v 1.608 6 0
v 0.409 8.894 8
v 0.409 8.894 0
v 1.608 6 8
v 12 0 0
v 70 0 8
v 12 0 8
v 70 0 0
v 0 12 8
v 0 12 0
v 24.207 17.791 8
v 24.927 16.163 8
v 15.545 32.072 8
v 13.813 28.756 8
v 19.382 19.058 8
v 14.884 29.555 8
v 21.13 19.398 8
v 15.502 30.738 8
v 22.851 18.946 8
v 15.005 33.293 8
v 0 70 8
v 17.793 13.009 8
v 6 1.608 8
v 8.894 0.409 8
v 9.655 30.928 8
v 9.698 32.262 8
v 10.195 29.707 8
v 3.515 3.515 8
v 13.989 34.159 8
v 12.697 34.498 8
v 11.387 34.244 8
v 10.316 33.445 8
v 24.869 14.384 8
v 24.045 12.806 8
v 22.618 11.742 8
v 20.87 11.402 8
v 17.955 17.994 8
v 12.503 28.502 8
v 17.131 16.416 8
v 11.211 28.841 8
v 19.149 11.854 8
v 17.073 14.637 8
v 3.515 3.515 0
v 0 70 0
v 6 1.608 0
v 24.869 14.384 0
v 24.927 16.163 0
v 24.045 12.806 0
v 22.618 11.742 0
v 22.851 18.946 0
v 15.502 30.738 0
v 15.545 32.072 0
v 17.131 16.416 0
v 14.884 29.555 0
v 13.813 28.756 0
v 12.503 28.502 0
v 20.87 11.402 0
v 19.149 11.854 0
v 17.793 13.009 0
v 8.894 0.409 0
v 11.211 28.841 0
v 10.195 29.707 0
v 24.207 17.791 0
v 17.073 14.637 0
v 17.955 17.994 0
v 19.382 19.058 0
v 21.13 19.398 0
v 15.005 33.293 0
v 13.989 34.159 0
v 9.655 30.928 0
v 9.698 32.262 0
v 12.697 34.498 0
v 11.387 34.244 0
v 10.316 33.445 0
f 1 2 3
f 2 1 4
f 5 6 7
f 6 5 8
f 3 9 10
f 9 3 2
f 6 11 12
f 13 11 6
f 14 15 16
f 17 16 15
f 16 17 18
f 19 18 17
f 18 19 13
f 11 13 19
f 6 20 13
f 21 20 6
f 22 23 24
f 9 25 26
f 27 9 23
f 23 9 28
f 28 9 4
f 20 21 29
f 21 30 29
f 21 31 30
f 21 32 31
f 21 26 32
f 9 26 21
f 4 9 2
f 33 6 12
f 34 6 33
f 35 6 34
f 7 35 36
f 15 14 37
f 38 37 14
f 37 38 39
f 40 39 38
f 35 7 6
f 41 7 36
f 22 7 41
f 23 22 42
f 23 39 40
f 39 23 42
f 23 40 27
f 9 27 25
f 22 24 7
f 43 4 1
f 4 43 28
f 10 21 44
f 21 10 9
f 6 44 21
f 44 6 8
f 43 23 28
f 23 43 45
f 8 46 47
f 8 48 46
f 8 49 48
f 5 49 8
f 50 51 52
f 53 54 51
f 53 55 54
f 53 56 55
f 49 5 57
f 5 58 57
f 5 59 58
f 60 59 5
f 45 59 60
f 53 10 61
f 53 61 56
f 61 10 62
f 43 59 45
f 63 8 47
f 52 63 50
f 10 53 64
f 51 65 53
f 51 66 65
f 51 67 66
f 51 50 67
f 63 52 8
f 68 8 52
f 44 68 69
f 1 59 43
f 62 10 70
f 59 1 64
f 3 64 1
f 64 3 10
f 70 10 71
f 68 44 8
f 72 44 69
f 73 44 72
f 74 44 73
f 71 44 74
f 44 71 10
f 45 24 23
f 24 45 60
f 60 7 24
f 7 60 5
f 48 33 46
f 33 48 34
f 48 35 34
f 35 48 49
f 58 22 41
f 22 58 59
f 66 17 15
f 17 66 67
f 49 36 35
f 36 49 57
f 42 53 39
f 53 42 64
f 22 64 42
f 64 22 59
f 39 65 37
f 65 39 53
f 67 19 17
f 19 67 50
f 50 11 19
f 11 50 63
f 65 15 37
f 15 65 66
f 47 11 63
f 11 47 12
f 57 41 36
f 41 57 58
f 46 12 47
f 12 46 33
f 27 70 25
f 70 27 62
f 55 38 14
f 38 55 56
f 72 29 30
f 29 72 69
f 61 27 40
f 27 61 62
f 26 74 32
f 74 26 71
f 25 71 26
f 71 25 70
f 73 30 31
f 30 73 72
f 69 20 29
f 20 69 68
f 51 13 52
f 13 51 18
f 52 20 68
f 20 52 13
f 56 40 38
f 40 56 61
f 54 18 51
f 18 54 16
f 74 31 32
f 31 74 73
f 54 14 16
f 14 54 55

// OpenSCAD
$fn = 32;

// ----------------------------------------------------------------------
// Bracket plate: corner pad 70 x 70, fillet R12
// ----------------------------------------------------------------------

// --- parameters (mm) ---
hole_r = 3;               // bolt hole radius
plate_t = 8;              // plate thickness, Z (extrusion height)
leg_a = 70;               // base leg
leg_b = 70;               // height leg
fillet_r = 12;            // right-angle fillet radius

hole_d1 = 2 * hole_r + 2;
hole_d2 = 2 * hole_r;

profile = [[12, 0], [70, 0], [0, 70], [0, 12], [0.409, 8.894], [1.608, 6], [3.515, 3.515], [6, 1.608], [8.894, 0.409]];  // primary outline, 9 points, counter clockwise
void_1 = [[24.927, 16.163], [24.207, 17.791], [22.851, 18.946], [21.13, 19.398], [19.382, 19.058], [17.955, 17.994], [17.131, 16.416], [17.073, 14.637], [17.793, 13.009], [19.149, 11.854], [20.87, 11.402], [22.618, 11.742], [24.045, 12.806], [24.869, 14.384]];  // mount hole 1, 14 points
void_2 = [[15.545, 32.072], [15.005, 33.293], [13.989, 34.159], [12.697, 34.498], [11.387, 34.244], [10.316, 33.445], [9.698, 32.262], [9.655, 30.928], [10.195, 29.707], [11.211, 28.841], [12.503, 28.502], [13.813, 28.756], [14.884, 29.555], [15.502, 30.738]];  // mount hole 2, 14 points

// --- the one profile operation ---
difference() {
  linear_extrude(height = plate_t) polygon(points = profile);
  translate([0, 0, -1])
    linear_extrude(height = plate_t + 2) polygon(points = void_1);
  translate([0, 0, -1])
    linear_extrude(height = plate_t + 2) polygon(points = void_2);
}
